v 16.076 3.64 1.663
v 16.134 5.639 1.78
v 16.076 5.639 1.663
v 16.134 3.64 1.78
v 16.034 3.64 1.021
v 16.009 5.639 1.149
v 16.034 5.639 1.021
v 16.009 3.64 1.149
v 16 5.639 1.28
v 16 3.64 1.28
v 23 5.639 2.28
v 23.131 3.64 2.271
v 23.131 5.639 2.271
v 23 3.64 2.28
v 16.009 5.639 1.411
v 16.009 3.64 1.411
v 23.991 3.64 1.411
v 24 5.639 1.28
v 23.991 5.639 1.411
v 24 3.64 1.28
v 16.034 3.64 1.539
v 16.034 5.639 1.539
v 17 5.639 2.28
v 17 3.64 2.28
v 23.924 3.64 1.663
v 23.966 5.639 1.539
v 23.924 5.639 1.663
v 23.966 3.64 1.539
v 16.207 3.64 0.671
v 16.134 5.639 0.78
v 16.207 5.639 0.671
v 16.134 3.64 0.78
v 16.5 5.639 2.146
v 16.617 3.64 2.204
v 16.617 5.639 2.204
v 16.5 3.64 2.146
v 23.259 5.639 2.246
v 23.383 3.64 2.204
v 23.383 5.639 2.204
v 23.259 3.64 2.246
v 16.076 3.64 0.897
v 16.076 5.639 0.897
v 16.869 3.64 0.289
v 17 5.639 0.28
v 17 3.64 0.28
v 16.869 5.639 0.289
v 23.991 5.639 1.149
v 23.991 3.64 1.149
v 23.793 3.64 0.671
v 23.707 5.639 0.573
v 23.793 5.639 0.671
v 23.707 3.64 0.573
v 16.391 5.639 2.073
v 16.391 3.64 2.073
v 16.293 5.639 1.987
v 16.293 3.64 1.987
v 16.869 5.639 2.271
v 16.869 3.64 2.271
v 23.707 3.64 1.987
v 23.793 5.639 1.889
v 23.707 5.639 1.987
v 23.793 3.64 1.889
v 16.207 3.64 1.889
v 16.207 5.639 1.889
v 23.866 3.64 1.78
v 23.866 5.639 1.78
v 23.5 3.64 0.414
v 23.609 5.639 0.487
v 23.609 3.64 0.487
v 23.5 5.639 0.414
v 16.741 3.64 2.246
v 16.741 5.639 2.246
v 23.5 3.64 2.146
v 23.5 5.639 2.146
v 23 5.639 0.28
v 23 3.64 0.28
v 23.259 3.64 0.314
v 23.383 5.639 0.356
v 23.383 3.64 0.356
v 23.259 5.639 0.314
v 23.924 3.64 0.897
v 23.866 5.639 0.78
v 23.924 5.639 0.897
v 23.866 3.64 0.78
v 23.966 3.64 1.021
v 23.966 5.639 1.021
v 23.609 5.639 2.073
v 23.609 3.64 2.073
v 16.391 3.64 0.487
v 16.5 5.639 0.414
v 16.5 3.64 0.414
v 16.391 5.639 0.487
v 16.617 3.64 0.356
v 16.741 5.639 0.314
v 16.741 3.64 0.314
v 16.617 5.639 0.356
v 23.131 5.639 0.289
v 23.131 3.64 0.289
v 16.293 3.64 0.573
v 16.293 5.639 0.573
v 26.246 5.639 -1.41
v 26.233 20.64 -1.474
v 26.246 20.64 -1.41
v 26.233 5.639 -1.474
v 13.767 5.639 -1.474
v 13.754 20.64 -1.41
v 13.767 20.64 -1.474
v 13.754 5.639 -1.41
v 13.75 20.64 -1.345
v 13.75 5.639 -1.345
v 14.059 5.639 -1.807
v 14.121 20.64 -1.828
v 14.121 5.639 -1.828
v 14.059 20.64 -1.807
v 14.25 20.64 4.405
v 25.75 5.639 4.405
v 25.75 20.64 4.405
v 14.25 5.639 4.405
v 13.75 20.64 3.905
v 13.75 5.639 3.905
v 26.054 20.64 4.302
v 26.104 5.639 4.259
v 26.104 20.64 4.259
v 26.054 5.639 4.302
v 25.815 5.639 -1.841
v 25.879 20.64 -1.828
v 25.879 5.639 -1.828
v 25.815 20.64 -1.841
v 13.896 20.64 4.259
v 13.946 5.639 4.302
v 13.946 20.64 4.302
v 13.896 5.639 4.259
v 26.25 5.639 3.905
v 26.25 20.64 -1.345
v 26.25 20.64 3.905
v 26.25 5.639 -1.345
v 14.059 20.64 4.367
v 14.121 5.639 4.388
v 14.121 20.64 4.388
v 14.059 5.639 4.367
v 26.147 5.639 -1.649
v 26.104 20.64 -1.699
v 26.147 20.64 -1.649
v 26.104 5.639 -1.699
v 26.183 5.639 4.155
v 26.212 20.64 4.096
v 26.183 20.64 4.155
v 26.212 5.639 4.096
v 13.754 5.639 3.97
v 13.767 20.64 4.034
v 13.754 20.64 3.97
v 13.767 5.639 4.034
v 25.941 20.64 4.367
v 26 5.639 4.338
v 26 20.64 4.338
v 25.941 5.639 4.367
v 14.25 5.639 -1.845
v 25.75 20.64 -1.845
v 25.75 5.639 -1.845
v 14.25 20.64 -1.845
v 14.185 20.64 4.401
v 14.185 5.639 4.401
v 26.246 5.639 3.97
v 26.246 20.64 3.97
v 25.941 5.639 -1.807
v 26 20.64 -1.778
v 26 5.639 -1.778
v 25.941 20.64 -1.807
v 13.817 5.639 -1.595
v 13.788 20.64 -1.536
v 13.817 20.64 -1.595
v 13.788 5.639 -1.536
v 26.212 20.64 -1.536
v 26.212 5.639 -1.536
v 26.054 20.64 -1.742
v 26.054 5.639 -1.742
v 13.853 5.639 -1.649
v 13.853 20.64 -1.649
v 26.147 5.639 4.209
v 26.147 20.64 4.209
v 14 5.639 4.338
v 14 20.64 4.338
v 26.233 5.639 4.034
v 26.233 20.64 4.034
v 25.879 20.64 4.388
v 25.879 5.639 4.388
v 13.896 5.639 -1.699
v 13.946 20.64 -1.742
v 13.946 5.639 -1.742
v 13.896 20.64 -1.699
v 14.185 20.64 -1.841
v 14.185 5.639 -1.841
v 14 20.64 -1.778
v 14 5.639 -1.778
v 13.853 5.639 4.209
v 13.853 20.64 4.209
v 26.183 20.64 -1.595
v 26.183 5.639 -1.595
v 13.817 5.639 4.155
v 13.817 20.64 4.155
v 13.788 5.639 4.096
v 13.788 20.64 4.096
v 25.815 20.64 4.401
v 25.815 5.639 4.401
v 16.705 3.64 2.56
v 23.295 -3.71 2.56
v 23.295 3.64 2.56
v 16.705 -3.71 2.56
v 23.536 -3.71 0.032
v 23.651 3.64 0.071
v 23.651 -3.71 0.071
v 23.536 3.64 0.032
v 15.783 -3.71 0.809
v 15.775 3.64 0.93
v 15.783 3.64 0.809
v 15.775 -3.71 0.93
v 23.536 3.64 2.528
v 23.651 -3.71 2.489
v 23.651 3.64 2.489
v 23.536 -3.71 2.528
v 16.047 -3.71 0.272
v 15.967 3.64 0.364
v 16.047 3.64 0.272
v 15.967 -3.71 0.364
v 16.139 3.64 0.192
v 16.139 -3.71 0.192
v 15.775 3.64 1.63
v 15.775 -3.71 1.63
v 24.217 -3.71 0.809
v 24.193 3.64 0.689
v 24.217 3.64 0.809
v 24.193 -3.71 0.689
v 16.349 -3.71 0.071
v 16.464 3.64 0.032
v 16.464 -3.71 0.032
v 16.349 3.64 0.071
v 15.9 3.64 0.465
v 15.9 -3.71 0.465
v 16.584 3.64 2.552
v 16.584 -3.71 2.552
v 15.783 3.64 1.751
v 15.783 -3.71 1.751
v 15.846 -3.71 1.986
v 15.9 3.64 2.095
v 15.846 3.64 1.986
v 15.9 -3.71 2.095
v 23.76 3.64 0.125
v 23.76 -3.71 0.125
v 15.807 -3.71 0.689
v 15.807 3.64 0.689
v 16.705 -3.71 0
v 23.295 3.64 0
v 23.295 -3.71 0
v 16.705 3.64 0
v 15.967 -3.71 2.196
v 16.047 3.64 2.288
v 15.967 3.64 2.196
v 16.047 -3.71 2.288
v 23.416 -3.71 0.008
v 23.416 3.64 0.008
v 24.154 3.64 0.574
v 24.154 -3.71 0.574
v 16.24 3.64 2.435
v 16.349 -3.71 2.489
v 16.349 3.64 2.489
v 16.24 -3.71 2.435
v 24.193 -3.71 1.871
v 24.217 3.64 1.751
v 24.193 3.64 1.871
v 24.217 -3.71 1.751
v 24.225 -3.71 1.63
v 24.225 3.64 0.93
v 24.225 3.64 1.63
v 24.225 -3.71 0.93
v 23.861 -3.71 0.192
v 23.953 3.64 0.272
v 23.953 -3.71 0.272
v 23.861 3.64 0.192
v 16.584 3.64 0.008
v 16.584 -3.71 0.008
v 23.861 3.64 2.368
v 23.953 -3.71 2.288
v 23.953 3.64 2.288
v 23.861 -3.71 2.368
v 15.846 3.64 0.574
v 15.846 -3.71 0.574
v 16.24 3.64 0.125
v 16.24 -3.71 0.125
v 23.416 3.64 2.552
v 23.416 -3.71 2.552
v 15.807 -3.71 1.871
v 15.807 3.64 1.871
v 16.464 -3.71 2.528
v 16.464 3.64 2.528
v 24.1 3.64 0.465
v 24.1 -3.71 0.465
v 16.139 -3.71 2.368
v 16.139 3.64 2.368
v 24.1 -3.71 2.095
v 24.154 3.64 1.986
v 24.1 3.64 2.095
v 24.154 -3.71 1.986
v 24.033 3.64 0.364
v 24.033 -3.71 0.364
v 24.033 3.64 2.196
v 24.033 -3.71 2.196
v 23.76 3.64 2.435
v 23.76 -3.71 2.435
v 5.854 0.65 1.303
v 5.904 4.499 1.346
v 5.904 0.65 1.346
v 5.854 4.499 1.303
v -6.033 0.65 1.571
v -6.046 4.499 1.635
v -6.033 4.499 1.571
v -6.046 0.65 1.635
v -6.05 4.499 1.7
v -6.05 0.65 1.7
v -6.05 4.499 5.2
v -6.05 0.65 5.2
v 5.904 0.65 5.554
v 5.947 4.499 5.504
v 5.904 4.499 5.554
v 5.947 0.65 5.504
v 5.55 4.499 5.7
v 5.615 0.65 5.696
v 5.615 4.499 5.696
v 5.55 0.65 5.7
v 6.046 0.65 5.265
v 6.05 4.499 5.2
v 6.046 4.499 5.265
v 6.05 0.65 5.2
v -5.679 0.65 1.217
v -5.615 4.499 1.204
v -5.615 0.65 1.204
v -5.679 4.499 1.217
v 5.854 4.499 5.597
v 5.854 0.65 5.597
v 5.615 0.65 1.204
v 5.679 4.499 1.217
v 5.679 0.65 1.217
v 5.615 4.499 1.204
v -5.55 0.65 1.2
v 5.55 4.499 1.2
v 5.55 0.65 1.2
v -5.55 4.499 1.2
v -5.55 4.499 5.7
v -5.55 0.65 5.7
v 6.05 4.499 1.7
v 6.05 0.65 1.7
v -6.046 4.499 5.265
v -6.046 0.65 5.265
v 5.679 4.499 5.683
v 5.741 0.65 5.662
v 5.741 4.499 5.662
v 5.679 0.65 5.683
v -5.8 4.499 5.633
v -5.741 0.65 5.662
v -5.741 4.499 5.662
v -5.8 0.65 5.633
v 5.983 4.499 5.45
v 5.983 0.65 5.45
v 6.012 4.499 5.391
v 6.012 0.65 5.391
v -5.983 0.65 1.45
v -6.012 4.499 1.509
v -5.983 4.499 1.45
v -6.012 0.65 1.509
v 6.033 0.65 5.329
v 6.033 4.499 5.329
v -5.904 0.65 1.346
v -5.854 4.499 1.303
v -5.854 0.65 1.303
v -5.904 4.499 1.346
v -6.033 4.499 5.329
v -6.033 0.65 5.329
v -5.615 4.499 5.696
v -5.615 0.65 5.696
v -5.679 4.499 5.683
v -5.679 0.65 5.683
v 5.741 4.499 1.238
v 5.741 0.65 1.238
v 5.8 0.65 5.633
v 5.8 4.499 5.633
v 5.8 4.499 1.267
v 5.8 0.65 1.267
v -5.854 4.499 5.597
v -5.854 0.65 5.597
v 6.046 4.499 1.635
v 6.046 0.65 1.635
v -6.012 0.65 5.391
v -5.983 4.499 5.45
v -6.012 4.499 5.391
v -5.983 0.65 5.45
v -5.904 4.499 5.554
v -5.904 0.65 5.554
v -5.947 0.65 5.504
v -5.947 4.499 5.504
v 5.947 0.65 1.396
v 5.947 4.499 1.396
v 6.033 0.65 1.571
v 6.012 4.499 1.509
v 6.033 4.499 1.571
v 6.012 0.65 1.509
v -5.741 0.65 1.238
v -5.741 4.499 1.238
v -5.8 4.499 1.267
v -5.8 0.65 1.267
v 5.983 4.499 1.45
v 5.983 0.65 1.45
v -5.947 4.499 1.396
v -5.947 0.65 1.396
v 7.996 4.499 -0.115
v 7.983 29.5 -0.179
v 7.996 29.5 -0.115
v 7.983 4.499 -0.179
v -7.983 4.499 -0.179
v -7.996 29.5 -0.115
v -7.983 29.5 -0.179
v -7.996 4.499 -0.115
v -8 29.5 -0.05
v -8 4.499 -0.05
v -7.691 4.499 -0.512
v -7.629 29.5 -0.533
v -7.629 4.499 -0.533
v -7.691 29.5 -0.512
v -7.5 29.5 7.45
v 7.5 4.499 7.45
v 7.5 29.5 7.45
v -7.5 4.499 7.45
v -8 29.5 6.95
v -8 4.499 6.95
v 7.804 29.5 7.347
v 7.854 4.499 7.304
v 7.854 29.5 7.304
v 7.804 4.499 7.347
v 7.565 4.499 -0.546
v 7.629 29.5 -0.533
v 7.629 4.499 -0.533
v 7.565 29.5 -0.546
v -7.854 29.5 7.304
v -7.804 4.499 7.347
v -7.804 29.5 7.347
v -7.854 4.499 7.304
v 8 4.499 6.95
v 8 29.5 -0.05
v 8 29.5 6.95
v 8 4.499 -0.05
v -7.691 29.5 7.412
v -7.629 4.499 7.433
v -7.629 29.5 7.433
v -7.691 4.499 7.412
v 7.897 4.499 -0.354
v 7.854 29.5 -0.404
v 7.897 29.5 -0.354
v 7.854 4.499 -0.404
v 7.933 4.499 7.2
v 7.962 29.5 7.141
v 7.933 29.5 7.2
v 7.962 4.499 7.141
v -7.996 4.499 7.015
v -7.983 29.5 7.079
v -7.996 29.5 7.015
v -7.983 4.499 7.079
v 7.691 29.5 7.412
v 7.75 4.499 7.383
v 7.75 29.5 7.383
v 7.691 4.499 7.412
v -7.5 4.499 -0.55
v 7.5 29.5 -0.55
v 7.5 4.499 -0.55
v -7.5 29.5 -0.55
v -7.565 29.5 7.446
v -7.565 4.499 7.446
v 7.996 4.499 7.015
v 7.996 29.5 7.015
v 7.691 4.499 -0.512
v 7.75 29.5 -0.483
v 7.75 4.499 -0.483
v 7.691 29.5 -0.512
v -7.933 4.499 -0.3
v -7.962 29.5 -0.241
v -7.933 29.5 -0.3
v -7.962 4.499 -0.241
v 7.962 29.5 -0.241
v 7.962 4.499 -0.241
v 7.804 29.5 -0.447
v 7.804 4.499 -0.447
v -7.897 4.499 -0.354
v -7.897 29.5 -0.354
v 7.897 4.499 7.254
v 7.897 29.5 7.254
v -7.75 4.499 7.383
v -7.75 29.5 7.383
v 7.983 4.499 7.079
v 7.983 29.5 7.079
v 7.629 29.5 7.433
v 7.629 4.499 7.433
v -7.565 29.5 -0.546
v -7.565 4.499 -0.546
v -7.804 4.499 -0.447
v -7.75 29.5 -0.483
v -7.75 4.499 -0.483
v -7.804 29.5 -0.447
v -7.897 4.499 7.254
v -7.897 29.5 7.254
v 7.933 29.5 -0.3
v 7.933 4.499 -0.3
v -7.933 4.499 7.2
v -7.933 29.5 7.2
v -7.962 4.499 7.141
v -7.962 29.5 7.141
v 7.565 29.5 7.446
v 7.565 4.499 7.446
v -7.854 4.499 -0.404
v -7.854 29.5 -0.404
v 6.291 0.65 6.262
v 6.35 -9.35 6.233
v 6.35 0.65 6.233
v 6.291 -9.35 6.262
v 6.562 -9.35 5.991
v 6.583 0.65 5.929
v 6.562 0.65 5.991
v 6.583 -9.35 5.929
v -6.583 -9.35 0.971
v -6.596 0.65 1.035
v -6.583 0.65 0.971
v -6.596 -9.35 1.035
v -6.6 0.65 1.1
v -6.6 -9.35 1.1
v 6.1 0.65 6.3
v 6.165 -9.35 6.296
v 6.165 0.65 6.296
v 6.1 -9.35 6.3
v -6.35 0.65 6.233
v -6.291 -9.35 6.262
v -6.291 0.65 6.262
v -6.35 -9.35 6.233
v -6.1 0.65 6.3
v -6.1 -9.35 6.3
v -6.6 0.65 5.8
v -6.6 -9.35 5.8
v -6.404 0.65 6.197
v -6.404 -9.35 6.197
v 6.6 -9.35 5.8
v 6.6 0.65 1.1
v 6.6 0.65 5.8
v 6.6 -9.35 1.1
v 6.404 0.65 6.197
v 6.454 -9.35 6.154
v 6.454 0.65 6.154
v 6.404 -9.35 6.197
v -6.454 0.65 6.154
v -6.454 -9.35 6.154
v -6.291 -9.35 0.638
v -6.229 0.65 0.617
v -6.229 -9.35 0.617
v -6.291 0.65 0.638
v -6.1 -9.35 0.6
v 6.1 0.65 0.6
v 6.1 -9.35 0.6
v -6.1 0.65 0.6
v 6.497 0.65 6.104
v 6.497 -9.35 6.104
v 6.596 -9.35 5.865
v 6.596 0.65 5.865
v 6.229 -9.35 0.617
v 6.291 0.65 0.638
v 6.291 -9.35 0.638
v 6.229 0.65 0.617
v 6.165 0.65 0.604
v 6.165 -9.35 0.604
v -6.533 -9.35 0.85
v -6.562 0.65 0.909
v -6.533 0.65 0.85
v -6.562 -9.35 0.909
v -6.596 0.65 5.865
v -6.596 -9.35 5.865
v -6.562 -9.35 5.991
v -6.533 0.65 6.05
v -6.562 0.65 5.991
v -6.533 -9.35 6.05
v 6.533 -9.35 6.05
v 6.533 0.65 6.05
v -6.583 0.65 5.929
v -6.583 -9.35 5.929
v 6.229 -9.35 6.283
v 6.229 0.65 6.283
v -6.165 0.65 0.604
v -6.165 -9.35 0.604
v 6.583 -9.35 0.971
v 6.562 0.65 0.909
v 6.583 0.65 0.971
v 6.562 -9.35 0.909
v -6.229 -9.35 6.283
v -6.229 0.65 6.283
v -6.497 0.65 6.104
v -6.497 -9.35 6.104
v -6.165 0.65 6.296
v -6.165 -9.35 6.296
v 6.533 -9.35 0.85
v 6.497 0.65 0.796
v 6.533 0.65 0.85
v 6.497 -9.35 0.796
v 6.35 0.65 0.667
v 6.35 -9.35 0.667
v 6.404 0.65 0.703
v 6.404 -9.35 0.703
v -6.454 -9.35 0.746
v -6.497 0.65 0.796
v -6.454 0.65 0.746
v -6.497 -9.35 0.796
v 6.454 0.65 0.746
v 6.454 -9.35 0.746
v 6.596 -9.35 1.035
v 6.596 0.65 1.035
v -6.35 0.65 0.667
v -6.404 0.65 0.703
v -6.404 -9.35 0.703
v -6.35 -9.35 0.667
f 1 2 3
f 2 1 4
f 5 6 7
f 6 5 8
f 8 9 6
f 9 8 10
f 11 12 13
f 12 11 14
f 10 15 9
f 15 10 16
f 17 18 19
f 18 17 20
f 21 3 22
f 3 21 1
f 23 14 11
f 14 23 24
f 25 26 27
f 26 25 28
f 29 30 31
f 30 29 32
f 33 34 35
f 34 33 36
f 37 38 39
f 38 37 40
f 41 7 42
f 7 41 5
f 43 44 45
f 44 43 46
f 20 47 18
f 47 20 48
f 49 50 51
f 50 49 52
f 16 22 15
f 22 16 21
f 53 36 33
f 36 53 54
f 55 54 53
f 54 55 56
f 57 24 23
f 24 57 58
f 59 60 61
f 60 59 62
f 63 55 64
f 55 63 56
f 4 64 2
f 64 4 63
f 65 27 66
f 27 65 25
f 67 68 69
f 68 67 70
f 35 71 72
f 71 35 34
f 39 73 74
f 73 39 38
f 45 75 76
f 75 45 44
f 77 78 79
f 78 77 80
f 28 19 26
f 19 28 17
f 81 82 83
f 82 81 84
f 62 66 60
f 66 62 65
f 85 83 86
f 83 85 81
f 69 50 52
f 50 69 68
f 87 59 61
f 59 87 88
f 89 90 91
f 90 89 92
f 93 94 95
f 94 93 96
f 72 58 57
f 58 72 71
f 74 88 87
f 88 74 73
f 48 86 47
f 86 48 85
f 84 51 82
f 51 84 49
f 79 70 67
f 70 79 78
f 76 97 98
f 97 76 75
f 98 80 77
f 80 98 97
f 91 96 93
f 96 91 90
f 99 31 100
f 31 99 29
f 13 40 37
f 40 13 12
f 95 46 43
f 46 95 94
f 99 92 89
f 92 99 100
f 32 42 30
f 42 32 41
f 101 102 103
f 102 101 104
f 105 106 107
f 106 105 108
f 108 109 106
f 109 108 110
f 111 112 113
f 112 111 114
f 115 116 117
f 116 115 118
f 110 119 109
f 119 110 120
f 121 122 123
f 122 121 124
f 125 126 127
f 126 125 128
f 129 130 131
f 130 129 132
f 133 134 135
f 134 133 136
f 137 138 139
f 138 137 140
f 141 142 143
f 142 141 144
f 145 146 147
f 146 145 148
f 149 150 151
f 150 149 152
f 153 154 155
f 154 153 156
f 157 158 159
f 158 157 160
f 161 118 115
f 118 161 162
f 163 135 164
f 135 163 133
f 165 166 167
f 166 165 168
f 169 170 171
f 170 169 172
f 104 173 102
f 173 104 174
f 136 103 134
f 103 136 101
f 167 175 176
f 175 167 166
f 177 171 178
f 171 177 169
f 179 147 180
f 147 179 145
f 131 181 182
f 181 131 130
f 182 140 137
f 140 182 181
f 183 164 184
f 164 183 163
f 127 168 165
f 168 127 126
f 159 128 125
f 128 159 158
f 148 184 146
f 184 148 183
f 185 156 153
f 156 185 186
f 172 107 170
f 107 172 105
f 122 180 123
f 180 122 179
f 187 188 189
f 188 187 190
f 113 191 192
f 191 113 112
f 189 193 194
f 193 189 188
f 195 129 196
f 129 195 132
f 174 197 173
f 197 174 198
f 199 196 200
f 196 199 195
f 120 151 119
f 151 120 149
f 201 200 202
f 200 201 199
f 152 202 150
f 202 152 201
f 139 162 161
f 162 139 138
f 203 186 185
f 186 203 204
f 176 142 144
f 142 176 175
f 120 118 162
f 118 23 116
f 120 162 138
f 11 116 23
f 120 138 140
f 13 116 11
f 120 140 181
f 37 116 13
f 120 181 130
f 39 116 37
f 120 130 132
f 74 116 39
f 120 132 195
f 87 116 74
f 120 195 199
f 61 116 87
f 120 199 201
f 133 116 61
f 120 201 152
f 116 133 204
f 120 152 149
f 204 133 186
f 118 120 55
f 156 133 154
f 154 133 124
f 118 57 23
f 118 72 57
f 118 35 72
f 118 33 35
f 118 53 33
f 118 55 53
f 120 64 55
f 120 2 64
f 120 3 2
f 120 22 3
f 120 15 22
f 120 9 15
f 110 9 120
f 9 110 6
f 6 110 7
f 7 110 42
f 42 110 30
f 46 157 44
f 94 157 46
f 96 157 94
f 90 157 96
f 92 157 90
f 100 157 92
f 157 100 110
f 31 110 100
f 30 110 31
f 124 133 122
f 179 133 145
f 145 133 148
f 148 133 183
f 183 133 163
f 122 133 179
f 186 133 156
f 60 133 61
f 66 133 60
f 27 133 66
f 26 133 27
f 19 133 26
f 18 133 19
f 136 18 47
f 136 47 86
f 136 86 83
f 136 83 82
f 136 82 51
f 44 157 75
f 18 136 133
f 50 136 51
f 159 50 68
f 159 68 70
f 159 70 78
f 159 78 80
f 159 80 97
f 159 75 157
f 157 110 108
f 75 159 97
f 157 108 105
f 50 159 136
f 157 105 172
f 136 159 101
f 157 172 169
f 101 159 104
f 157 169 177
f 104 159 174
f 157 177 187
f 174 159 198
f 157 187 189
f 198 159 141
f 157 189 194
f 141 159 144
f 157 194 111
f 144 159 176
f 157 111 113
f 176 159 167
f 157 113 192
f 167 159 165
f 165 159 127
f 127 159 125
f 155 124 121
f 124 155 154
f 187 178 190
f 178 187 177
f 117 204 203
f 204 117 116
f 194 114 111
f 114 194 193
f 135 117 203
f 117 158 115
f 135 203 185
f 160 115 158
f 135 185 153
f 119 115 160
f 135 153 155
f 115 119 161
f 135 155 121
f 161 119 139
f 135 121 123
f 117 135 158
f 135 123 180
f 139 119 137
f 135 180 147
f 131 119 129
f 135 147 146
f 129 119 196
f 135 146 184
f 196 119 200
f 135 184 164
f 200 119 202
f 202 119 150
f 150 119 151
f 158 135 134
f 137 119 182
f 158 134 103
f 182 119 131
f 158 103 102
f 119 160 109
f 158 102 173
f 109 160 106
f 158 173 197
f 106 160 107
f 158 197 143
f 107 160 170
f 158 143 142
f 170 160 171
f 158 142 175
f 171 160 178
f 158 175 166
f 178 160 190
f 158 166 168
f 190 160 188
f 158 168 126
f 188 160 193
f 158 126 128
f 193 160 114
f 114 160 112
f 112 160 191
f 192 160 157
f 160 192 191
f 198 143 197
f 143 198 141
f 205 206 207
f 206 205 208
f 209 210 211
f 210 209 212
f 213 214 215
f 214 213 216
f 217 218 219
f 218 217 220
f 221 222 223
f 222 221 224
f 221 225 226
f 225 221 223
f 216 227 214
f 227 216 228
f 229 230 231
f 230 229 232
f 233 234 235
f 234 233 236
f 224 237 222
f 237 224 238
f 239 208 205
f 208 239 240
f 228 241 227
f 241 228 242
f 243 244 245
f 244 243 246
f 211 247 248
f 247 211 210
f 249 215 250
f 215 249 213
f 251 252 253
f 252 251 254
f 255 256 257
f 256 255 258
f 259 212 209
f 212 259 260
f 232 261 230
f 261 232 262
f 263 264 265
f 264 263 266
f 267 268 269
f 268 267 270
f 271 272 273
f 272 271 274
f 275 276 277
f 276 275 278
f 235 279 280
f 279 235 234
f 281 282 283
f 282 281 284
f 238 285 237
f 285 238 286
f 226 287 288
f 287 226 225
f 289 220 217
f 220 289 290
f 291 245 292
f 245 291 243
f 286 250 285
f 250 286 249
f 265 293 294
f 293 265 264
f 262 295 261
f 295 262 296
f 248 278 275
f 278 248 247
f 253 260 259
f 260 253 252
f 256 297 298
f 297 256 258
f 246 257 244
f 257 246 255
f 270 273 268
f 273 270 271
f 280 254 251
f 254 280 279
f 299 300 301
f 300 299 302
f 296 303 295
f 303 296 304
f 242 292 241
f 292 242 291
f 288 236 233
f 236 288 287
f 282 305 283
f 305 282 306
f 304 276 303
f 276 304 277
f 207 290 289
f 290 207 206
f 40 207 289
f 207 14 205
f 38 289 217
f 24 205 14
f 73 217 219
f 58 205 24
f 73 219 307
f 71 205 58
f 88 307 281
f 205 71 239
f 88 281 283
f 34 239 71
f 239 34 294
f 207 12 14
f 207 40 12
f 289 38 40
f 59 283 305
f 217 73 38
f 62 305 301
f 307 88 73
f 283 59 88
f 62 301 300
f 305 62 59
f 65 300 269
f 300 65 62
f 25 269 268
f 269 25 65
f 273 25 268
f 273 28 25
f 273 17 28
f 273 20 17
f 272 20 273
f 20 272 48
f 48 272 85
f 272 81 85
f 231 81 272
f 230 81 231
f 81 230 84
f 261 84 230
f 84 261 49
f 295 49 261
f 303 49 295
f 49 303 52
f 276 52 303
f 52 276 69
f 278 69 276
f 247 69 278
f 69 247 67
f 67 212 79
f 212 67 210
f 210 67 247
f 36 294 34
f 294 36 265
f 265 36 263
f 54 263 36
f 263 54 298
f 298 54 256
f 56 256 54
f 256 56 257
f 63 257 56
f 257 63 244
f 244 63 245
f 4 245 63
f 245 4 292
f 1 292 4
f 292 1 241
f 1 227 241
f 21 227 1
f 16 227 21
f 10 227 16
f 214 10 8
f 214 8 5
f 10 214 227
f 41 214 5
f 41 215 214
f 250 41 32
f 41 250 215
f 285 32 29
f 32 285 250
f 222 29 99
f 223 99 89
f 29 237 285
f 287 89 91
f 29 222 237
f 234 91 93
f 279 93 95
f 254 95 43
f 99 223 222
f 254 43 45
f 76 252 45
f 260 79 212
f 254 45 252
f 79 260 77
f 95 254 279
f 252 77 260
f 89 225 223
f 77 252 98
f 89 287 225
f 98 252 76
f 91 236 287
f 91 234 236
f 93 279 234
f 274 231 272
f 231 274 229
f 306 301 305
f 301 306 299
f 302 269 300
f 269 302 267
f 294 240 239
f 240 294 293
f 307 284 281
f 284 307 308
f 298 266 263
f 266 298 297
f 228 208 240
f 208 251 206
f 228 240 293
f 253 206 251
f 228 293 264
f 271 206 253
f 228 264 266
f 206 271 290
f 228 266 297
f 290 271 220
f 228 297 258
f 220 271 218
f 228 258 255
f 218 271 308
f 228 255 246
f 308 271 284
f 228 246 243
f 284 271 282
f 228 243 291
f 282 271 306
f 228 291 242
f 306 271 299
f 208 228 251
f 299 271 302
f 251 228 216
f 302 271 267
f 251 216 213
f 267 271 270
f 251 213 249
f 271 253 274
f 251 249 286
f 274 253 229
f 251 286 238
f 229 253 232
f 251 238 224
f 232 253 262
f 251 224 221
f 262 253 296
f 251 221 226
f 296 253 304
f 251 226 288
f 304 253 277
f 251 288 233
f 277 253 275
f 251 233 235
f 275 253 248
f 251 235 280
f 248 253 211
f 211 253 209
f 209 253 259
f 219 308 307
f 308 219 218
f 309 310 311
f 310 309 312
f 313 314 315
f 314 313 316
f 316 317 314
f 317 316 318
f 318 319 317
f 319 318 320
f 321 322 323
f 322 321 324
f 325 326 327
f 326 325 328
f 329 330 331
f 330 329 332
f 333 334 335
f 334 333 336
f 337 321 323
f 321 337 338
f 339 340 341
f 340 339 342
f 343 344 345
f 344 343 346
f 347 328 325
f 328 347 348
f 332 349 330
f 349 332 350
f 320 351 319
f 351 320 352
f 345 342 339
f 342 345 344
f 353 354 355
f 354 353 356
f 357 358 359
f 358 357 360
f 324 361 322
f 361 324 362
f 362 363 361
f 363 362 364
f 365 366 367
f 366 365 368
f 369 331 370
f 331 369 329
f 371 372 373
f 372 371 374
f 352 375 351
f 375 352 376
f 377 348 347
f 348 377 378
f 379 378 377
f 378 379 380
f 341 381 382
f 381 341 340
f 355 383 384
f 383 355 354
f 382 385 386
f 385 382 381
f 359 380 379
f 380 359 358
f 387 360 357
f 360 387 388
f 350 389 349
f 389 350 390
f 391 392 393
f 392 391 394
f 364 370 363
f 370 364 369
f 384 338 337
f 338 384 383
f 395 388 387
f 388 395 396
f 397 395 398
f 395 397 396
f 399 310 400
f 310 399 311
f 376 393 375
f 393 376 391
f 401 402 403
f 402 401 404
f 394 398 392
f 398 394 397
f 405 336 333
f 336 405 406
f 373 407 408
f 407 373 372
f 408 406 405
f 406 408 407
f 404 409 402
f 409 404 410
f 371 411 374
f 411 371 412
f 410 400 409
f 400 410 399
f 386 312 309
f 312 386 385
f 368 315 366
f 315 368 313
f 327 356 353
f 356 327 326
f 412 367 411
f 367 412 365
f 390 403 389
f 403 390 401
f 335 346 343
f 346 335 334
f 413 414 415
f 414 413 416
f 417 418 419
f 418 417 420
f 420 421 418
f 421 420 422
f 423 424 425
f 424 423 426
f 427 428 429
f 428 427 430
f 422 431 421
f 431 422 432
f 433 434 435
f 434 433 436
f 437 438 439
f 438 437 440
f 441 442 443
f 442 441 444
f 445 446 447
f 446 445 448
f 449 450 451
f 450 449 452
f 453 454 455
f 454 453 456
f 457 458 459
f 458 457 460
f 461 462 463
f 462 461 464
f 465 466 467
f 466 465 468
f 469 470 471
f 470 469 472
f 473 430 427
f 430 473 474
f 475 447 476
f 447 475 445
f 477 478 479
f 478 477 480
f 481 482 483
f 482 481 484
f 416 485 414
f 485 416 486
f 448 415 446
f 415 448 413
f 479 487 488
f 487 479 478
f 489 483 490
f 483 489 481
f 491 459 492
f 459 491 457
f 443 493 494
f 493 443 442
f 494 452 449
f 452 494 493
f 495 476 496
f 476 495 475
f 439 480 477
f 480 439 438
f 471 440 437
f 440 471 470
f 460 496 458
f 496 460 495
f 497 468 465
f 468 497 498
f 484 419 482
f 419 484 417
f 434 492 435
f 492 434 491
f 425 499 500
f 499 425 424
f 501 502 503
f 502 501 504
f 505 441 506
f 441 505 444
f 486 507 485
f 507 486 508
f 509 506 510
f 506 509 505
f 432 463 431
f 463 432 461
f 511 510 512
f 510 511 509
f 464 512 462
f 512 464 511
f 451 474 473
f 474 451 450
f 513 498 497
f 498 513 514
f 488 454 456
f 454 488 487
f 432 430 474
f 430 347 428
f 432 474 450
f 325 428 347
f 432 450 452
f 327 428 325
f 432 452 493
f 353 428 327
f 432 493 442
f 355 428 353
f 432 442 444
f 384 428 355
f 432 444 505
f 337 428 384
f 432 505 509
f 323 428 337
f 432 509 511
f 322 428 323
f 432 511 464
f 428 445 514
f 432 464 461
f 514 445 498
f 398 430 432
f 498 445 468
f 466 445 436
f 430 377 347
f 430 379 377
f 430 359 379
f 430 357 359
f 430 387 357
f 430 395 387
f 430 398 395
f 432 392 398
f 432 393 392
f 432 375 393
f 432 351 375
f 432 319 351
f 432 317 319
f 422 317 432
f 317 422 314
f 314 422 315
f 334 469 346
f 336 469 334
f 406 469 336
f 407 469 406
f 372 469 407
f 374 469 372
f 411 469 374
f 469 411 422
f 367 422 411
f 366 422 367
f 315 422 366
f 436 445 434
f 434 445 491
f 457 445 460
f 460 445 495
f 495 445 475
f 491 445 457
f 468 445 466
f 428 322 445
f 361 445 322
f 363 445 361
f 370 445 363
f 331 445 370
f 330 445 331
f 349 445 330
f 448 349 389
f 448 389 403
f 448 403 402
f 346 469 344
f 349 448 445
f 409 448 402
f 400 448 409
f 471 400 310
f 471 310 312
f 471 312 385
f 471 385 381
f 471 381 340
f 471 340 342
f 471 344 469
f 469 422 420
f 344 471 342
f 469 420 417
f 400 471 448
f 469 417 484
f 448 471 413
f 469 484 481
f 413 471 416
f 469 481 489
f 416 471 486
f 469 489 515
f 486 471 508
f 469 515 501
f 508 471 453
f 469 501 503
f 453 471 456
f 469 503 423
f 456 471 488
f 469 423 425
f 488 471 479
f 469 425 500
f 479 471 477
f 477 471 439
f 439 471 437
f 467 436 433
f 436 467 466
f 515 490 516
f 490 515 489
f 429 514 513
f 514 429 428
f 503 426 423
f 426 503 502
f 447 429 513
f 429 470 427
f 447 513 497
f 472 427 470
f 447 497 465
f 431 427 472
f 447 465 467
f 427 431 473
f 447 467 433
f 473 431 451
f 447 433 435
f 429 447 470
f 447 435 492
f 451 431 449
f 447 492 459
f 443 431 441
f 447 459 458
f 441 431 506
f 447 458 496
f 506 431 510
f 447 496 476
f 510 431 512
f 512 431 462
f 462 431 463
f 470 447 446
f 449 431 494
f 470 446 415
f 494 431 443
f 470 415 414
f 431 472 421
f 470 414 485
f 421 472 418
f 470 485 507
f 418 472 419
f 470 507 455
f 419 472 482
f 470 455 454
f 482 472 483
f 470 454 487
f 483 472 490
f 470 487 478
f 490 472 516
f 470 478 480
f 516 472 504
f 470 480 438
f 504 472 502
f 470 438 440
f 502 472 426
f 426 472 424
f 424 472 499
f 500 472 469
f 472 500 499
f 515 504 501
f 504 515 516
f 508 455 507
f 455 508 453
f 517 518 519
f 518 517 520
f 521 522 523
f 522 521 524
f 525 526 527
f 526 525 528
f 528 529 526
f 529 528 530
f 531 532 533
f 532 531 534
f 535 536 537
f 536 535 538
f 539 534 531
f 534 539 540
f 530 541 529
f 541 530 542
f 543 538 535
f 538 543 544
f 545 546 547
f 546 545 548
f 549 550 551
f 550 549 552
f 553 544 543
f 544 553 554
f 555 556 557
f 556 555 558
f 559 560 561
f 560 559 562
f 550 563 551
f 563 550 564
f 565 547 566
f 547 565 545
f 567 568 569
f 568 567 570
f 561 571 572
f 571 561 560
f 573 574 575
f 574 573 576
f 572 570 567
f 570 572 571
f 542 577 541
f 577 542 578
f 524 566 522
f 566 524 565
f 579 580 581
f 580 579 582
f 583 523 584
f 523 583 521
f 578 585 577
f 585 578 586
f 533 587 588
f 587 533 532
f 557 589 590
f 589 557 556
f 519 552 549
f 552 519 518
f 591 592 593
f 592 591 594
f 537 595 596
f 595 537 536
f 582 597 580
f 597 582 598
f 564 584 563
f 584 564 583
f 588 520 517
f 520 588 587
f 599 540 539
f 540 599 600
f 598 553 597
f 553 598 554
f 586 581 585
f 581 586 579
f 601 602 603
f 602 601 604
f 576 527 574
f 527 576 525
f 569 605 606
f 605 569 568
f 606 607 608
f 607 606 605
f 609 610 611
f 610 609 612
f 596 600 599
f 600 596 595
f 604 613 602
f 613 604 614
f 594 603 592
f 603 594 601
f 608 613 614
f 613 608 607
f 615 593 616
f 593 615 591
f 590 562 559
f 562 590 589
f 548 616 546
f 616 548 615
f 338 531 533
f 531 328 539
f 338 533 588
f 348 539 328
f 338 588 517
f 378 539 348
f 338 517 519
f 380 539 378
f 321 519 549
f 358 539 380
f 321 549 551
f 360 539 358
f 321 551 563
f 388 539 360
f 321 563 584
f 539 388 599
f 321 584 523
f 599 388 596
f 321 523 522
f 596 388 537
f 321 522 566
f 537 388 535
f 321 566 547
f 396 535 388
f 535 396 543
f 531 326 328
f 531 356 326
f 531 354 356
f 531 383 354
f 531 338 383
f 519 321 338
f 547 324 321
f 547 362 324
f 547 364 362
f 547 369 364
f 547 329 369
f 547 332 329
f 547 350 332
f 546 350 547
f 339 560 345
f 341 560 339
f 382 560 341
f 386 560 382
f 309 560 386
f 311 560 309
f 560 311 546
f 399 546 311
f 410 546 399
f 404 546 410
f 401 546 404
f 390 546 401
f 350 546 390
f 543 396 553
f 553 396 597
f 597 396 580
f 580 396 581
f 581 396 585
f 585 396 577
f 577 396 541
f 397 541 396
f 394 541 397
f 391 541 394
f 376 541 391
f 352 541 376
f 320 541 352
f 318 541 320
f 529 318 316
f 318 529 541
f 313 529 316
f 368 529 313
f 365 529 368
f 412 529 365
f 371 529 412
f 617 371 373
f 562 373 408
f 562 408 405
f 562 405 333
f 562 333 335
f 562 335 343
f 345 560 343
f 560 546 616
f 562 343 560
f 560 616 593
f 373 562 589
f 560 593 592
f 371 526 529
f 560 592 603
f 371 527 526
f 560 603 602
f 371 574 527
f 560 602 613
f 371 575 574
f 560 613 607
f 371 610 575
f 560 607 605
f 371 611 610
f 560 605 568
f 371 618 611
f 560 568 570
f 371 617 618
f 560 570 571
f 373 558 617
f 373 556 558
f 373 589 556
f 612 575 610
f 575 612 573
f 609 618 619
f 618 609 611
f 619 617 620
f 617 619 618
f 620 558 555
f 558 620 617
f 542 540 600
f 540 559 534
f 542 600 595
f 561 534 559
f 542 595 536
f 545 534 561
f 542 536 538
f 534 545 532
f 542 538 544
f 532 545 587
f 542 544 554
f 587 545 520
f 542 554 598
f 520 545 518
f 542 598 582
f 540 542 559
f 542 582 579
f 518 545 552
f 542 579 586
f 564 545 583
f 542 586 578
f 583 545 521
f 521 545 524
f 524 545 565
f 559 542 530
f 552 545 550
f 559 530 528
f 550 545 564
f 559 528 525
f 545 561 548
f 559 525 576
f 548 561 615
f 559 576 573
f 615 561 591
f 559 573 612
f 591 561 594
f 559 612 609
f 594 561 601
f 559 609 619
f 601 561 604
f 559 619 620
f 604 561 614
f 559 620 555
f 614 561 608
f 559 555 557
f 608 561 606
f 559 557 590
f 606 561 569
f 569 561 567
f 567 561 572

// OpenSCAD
e=.001;
$fn=48;

usb_c_depth = 7.35;
usb_c_width = 8.45;
usb_c_height = 2.56;
usb_c_edge_radius = .93;
usb_c_front_from_origin = 6.77-3.13;
usb_c_plug_end = 1.77-3.13;

usb_c_plug_depth = 7;
usb_c_plug_width = 8;
usb_c_plug_height = 2;

usb_c_plug_shroud_width = 12.5;
usb_c_plug_shroud_height = 6.25;
usb_c_plug_shroud_depth = 15;
usb_c_plug_shroud_radius = .5;

usb_a_depth = 10;
usb_a_width = 13.2;
usb_a_height = 5.7;
usb_a_edge_radius = .5;
usb_a_z = .6;
usb_a_overlap = .65;

usb_a_plug_depth = 12.5;
usb_a_plug_width = 12.1;
usb_a_plug_height = 4.5;
usb_a_plug_radius = .5;
usb_a_plug_end = -8;

usb_a_plug_shroud_width = 16;
usb_a_plug_shroud_height = 8;
usb_a_plug_shroud_depth = 25;
usb_a_plug_shroud_radius = .5;

module rounded_rect(w, h, r, center=false)
{
	off_x = center ? w/2 : 0 ;
	off_y = center ? h/2 : 0 ;
	hull()
	{
		for (x=[r,w-r])
		for (y=[r,h-r])
		translate([off_x+x,off_y+y])
		circle(r=r);
	}
}

module usb_c_keepout()
{
	color([.9,.9,.9])
	{
		translate([-10, -9.2/2.+1.25, 0])
			cube([20, 9.2-2.5, 3.2]);
		
		for (y=[-9.2/2.+1.25, 9.2/2.-1.25])
			translate([-10, y, 1.6])
				rotate([0,90,0])
					scale([1.6,1.25,1])
						cylinder(h=20, r=1);
	}
}

module usb_c_plug(margin=0)
{
color([.97,.97,.97])

translate([-usb_c_plug_width/2-margin,
            usb_c_plug_depth+margin,
           -usb_c_plug_height/2-margin ])
rotate([90,0,0])
linear_extrude(usb_c_plug_depth+2*margin+e) rounded_rect(usb_c_plug_width+2*margin, usb_c_plug_height+2*margin, usb_c_plug_height/2+margin);
	
color([.3,.3,.3])

translate([-usb_c_plug_shroud_width/2-margin,
            usb_c_plug_depth+usb_c_plug_shroud_depth+margin,
           -usb_c_plug_shroud_height/2-margin ])
rotate([90,0,0])
linear_extrude(usb_c_plug_shroud_depth+2*margin+e) rounded_rect(usb_c_plug_shroud_width+2*margin, usb_c_plug_shroud_height+2*margin, usb_c_plug_shroud_radius+margin);
	

}

module usb_c_type_c31_m12(margin=0)
{

	color([.9,.9,.9])
	{

translate([-usb_c_width/2-margin,usb_c_front_from_origin+margin,-margin ])
rotate([90,0,0])
linear_extrude(usb_c_depth+2*margin) rounded_rect(usb_c_width+2*margin, usb_c_height+2*margin, usb_c_edge_radius+margin);
	}
	translate([0,usb_c_plug_end,usb_c_height/2]) children();
}


module usb_a_shou_han(margin=0)
{
	color([.9,.9,.9])
	{

translate([-usb_a_width/2-margin,usb_a_overlap+margin,usb_a_z -margin ])
rotate([90,0,0])
linear_extrude(usb_a_depth+2*margin) rounded_rect(usb_a_width+2*margin, usb_a_height+2*margin, usb_a_edge_radius+margin);
	}
	translate([0,usb_a_plug_end/*+8.65*/,usb_a_height/2+usb_a_z]) children();

}


module usb_a_plug(margin=0)
{
color([.97,.97,.97])

translate([-usb_a_plug_width/2-margin,
            usb_a_plug_depth+margin,
           -usb_a_plug_height/2-margin ])
rotate([90,0,0])
linear_extrude(usb_a_plug_depth+2*margin+e) rounded_rect(usb_a_plug_width+2*margin, usb_a_plug_height+2*margin, usb_a_plug_radius+margin);
	
color([.3,.3,.3])

translate([-usb_a_plug_shroud_width/2-margin,
            usb_a_plug_depth+usb_a_plug_shroud_depth+margin,
           -usb_a_plug_shroud_height/2-margin ])
rotate([90,0,0])
linear_extrude(usb_a_plug_shroud_depth+2*margin+e) rounded_rect(usb_a_plug_shroud_width+2*margin, usb_a_plug_shroud_height+2*margin,usb_a_plug_shroud_radius+margin);
	

}


translate([20,0,0])usb_c_type_c31_m12(margin=0) usb_c_plug(margin=0);

usb_a_shou_han(margin=0) usb_a_plug(margin=0);
